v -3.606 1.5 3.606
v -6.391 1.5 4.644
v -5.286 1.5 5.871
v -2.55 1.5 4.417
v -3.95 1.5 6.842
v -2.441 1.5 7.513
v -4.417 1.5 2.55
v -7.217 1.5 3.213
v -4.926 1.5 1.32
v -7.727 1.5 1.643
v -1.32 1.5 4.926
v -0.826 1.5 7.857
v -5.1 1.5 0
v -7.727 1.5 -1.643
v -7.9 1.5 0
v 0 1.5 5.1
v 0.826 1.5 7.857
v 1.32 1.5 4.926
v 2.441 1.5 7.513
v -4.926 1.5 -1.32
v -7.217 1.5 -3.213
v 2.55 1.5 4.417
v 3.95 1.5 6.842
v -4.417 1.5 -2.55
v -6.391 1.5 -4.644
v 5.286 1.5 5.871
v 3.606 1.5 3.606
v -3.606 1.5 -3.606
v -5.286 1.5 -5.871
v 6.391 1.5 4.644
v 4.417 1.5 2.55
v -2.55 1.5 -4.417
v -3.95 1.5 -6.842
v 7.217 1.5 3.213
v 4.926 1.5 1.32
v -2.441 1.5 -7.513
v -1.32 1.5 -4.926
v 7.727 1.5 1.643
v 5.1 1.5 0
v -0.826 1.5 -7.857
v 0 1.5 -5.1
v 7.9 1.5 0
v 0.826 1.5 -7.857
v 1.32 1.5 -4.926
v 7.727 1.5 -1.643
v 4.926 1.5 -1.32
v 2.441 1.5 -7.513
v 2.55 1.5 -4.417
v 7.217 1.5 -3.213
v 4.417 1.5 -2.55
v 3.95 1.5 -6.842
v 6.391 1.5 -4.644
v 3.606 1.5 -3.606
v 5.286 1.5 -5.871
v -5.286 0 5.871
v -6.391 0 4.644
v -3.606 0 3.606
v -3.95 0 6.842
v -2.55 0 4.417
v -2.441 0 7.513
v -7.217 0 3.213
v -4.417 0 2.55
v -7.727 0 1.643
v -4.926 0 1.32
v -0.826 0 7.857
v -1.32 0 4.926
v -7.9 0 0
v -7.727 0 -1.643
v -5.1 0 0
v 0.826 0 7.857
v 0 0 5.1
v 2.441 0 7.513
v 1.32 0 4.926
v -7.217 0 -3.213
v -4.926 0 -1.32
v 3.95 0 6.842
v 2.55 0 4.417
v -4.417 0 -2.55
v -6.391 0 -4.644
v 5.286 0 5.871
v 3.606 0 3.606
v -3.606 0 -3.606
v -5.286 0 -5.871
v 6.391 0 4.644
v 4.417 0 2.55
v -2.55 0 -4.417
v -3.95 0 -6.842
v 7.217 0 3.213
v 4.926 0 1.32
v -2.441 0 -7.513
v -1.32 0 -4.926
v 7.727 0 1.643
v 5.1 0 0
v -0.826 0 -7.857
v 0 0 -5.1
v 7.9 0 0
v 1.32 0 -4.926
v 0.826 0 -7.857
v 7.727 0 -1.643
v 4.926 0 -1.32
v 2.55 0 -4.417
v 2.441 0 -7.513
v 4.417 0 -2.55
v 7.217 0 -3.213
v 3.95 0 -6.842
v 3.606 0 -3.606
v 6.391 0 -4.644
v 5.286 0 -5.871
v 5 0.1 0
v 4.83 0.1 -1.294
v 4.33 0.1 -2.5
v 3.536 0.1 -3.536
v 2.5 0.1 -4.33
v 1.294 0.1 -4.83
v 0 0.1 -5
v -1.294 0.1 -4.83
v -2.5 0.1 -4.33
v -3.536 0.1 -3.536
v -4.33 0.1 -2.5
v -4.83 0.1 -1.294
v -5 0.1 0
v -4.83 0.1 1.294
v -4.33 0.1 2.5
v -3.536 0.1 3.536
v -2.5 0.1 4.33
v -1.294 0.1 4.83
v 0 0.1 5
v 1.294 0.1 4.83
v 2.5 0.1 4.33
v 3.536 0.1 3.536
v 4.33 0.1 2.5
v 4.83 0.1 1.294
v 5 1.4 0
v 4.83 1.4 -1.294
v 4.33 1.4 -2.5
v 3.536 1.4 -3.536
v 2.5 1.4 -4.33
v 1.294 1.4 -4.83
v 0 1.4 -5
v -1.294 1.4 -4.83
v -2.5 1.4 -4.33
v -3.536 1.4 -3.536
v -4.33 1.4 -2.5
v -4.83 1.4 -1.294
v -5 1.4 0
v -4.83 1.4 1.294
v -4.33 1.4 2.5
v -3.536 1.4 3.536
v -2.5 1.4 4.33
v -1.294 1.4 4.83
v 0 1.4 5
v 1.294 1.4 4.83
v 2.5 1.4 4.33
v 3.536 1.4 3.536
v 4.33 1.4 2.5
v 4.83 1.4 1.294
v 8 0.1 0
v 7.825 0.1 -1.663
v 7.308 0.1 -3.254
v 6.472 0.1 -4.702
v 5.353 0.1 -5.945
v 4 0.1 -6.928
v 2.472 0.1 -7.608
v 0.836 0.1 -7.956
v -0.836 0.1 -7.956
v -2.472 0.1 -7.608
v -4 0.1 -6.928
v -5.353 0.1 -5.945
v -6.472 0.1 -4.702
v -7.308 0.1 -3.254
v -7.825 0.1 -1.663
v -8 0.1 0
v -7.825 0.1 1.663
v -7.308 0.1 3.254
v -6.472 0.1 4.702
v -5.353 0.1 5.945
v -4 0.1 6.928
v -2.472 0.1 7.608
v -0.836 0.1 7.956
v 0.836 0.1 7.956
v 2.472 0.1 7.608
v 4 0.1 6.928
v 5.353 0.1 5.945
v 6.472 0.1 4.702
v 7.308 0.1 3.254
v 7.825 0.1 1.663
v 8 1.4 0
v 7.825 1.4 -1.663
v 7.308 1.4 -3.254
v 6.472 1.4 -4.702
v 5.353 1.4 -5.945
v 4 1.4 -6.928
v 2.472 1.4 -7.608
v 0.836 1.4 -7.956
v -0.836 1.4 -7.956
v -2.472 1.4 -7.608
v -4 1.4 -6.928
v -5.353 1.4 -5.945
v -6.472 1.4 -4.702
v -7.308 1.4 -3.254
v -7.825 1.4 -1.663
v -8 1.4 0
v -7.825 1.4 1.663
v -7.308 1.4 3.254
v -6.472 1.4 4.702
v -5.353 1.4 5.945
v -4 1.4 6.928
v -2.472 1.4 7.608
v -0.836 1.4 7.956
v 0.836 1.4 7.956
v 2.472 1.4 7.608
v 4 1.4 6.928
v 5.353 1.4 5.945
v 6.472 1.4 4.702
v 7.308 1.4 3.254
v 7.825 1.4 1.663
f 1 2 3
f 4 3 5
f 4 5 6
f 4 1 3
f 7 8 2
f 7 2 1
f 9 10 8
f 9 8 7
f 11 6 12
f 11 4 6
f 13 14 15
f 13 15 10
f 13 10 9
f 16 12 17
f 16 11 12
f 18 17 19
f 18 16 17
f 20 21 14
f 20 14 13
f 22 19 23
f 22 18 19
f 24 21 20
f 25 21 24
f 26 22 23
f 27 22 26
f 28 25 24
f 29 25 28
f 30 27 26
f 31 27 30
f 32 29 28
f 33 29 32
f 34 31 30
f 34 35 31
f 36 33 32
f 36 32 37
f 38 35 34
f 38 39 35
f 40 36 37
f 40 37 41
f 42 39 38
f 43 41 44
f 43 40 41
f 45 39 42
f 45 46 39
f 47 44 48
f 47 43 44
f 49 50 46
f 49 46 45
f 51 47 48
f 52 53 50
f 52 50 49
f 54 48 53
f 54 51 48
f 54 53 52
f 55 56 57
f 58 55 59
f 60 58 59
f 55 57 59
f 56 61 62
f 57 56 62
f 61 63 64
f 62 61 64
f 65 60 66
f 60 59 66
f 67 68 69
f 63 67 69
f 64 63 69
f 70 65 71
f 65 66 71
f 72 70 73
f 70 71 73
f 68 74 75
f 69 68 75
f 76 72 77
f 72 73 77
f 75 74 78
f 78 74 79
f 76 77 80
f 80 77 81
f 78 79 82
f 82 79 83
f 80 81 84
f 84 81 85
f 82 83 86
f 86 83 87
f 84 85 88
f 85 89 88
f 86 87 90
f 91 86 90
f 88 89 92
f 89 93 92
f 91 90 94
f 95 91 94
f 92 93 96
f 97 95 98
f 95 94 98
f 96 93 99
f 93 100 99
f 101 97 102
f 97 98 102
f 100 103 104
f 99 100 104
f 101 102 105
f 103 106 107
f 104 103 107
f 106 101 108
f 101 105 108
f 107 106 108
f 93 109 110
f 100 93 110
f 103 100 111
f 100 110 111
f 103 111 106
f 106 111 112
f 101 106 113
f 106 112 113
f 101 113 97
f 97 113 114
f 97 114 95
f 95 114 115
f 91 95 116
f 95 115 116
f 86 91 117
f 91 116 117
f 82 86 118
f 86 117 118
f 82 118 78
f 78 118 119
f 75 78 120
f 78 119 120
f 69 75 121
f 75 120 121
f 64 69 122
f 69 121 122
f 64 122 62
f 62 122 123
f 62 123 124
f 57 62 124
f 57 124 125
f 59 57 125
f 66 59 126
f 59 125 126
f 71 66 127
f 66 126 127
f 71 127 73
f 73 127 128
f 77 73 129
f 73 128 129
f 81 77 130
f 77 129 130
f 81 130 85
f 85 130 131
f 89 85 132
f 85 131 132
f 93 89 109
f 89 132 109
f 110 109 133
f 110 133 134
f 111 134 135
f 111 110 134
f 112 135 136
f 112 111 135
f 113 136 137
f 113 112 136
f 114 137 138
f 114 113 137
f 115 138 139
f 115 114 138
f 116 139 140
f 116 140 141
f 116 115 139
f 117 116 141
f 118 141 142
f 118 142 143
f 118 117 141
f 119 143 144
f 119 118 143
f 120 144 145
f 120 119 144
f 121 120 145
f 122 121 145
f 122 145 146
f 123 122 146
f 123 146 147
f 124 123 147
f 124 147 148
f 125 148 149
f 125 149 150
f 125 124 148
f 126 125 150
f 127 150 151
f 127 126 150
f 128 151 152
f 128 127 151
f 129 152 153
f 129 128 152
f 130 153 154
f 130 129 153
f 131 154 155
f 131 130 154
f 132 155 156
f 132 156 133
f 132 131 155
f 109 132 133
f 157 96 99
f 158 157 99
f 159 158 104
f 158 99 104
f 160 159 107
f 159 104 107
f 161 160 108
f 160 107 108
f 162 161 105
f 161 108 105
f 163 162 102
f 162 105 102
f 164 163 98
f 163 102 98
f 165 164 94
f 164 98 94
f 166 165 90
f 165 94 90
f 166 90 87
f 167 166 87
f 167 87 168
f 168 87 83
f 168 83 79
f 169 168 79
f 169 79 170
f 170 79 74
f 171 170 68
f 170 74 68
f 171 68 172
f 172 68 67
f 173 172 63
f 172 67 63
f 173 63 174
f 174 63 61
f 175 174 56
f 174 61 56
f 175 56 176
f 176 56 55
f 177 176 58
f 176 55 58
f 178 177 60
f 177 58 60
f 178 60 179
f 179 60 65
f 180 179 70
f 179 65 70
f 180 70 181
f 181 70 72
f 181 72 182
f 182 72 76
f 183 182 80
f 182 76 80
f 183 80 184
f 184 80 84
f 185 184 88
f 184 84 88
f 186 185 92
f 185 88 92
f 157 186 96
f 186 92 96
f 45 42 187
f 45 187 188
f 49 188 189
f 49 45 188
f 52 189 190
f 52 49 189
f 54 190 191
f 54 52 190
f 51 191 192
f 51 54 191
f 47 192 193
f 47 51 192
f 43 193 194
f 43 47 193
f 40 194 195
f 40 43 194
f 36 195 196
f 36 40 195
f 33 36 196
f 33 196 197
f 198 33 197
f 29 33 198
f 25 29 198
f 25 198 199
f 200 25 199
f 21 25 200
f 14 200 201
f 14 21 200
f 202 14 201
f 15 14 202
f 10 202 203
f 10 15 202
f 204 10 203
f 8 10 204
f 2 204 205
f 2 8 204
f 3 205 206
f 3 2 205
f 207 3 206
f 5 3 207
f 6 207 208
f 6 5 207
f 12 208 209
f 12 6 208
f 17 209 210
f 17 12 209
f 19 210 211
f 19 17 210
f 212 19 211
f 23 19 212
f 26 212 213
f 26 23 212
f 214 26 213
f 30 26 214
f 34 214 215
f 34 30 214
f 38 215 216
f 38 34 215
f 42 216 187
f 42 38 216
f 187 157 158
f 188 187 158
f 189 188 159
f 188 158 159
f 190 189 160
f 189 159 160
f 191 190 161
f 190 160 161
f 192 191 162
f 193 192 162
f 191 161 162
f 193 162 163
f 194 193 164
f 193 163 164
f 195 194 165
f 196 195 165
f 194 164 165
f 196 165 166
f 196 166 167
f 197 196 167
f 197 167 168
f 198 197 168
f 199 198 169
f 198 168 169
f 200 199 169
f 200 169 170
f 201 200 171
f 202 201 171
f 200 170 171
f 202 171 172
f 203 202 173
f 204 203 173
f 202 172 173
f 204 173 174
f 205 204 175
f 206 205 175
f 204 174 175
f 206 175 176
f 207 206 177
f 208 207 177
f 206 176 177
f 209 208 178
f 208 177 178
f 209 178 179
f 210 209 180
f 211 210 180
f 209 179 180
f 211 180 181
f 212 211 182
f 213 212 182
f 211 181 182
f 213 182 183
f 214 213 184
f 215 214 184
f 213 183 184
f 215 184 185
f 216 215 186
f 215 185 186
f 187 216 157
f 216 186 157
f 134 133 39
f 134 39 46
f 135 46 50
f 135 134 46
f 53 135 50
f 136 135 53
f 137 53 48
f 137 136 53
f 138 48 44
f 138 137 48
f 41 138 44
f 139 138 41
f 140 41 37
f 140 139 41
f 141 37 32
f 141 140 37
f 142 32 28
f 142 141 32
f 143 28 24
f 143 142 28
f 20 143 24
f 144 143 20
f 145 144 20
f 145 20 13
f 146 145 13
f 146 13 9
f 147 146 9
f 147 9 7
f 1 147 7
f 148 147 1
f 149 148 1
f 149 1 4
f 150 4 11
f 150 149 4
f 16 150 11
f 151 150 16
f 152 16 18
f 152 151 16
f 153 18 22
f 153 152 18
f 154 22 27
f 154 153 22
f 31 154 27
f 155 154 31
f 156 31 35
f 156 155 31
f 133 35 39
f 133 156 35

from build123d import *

# Parameters (mm, degrees)
PROFILES_R    = 8
PROFILES_R_2  = 5
PROFILE_DEPTH = 1.5
OUTERC_SIZE   = 0.1
INNERC_SIZE   = 0.1


with BuildPart() as part:
    # ProfileS → Profile (new body)
    with BuildSketch(Plane(origin=(0, 0, 0), x_dir=(1, 0, 0), z_dir=(0, 1, 0))):
        Circle(PROFILES_R)
        Circle(PROFILES_R_2, mode=Mode.SUBTRACT)
    extrude(amount=PROFILE_DEPTH)

    # OuterC
    outerc_edges = [part.edges().sort_by_distance(p)[0] for p in [
        (-8, 0, 0),
        (-8, 1.5, 0),
    ]]
    chamfer(outerc_edges, length=OUTERC_SIZE)

    # InnerC
    innerc_edges = [part.edges().sort_by_distance(p)[0] for p in [
        (-5, 0, 0),
        (-5, 1.5, 0),
    ]]
    chamfer(innerc_edges, length=INNERC_SIZE)


solid = part.part
